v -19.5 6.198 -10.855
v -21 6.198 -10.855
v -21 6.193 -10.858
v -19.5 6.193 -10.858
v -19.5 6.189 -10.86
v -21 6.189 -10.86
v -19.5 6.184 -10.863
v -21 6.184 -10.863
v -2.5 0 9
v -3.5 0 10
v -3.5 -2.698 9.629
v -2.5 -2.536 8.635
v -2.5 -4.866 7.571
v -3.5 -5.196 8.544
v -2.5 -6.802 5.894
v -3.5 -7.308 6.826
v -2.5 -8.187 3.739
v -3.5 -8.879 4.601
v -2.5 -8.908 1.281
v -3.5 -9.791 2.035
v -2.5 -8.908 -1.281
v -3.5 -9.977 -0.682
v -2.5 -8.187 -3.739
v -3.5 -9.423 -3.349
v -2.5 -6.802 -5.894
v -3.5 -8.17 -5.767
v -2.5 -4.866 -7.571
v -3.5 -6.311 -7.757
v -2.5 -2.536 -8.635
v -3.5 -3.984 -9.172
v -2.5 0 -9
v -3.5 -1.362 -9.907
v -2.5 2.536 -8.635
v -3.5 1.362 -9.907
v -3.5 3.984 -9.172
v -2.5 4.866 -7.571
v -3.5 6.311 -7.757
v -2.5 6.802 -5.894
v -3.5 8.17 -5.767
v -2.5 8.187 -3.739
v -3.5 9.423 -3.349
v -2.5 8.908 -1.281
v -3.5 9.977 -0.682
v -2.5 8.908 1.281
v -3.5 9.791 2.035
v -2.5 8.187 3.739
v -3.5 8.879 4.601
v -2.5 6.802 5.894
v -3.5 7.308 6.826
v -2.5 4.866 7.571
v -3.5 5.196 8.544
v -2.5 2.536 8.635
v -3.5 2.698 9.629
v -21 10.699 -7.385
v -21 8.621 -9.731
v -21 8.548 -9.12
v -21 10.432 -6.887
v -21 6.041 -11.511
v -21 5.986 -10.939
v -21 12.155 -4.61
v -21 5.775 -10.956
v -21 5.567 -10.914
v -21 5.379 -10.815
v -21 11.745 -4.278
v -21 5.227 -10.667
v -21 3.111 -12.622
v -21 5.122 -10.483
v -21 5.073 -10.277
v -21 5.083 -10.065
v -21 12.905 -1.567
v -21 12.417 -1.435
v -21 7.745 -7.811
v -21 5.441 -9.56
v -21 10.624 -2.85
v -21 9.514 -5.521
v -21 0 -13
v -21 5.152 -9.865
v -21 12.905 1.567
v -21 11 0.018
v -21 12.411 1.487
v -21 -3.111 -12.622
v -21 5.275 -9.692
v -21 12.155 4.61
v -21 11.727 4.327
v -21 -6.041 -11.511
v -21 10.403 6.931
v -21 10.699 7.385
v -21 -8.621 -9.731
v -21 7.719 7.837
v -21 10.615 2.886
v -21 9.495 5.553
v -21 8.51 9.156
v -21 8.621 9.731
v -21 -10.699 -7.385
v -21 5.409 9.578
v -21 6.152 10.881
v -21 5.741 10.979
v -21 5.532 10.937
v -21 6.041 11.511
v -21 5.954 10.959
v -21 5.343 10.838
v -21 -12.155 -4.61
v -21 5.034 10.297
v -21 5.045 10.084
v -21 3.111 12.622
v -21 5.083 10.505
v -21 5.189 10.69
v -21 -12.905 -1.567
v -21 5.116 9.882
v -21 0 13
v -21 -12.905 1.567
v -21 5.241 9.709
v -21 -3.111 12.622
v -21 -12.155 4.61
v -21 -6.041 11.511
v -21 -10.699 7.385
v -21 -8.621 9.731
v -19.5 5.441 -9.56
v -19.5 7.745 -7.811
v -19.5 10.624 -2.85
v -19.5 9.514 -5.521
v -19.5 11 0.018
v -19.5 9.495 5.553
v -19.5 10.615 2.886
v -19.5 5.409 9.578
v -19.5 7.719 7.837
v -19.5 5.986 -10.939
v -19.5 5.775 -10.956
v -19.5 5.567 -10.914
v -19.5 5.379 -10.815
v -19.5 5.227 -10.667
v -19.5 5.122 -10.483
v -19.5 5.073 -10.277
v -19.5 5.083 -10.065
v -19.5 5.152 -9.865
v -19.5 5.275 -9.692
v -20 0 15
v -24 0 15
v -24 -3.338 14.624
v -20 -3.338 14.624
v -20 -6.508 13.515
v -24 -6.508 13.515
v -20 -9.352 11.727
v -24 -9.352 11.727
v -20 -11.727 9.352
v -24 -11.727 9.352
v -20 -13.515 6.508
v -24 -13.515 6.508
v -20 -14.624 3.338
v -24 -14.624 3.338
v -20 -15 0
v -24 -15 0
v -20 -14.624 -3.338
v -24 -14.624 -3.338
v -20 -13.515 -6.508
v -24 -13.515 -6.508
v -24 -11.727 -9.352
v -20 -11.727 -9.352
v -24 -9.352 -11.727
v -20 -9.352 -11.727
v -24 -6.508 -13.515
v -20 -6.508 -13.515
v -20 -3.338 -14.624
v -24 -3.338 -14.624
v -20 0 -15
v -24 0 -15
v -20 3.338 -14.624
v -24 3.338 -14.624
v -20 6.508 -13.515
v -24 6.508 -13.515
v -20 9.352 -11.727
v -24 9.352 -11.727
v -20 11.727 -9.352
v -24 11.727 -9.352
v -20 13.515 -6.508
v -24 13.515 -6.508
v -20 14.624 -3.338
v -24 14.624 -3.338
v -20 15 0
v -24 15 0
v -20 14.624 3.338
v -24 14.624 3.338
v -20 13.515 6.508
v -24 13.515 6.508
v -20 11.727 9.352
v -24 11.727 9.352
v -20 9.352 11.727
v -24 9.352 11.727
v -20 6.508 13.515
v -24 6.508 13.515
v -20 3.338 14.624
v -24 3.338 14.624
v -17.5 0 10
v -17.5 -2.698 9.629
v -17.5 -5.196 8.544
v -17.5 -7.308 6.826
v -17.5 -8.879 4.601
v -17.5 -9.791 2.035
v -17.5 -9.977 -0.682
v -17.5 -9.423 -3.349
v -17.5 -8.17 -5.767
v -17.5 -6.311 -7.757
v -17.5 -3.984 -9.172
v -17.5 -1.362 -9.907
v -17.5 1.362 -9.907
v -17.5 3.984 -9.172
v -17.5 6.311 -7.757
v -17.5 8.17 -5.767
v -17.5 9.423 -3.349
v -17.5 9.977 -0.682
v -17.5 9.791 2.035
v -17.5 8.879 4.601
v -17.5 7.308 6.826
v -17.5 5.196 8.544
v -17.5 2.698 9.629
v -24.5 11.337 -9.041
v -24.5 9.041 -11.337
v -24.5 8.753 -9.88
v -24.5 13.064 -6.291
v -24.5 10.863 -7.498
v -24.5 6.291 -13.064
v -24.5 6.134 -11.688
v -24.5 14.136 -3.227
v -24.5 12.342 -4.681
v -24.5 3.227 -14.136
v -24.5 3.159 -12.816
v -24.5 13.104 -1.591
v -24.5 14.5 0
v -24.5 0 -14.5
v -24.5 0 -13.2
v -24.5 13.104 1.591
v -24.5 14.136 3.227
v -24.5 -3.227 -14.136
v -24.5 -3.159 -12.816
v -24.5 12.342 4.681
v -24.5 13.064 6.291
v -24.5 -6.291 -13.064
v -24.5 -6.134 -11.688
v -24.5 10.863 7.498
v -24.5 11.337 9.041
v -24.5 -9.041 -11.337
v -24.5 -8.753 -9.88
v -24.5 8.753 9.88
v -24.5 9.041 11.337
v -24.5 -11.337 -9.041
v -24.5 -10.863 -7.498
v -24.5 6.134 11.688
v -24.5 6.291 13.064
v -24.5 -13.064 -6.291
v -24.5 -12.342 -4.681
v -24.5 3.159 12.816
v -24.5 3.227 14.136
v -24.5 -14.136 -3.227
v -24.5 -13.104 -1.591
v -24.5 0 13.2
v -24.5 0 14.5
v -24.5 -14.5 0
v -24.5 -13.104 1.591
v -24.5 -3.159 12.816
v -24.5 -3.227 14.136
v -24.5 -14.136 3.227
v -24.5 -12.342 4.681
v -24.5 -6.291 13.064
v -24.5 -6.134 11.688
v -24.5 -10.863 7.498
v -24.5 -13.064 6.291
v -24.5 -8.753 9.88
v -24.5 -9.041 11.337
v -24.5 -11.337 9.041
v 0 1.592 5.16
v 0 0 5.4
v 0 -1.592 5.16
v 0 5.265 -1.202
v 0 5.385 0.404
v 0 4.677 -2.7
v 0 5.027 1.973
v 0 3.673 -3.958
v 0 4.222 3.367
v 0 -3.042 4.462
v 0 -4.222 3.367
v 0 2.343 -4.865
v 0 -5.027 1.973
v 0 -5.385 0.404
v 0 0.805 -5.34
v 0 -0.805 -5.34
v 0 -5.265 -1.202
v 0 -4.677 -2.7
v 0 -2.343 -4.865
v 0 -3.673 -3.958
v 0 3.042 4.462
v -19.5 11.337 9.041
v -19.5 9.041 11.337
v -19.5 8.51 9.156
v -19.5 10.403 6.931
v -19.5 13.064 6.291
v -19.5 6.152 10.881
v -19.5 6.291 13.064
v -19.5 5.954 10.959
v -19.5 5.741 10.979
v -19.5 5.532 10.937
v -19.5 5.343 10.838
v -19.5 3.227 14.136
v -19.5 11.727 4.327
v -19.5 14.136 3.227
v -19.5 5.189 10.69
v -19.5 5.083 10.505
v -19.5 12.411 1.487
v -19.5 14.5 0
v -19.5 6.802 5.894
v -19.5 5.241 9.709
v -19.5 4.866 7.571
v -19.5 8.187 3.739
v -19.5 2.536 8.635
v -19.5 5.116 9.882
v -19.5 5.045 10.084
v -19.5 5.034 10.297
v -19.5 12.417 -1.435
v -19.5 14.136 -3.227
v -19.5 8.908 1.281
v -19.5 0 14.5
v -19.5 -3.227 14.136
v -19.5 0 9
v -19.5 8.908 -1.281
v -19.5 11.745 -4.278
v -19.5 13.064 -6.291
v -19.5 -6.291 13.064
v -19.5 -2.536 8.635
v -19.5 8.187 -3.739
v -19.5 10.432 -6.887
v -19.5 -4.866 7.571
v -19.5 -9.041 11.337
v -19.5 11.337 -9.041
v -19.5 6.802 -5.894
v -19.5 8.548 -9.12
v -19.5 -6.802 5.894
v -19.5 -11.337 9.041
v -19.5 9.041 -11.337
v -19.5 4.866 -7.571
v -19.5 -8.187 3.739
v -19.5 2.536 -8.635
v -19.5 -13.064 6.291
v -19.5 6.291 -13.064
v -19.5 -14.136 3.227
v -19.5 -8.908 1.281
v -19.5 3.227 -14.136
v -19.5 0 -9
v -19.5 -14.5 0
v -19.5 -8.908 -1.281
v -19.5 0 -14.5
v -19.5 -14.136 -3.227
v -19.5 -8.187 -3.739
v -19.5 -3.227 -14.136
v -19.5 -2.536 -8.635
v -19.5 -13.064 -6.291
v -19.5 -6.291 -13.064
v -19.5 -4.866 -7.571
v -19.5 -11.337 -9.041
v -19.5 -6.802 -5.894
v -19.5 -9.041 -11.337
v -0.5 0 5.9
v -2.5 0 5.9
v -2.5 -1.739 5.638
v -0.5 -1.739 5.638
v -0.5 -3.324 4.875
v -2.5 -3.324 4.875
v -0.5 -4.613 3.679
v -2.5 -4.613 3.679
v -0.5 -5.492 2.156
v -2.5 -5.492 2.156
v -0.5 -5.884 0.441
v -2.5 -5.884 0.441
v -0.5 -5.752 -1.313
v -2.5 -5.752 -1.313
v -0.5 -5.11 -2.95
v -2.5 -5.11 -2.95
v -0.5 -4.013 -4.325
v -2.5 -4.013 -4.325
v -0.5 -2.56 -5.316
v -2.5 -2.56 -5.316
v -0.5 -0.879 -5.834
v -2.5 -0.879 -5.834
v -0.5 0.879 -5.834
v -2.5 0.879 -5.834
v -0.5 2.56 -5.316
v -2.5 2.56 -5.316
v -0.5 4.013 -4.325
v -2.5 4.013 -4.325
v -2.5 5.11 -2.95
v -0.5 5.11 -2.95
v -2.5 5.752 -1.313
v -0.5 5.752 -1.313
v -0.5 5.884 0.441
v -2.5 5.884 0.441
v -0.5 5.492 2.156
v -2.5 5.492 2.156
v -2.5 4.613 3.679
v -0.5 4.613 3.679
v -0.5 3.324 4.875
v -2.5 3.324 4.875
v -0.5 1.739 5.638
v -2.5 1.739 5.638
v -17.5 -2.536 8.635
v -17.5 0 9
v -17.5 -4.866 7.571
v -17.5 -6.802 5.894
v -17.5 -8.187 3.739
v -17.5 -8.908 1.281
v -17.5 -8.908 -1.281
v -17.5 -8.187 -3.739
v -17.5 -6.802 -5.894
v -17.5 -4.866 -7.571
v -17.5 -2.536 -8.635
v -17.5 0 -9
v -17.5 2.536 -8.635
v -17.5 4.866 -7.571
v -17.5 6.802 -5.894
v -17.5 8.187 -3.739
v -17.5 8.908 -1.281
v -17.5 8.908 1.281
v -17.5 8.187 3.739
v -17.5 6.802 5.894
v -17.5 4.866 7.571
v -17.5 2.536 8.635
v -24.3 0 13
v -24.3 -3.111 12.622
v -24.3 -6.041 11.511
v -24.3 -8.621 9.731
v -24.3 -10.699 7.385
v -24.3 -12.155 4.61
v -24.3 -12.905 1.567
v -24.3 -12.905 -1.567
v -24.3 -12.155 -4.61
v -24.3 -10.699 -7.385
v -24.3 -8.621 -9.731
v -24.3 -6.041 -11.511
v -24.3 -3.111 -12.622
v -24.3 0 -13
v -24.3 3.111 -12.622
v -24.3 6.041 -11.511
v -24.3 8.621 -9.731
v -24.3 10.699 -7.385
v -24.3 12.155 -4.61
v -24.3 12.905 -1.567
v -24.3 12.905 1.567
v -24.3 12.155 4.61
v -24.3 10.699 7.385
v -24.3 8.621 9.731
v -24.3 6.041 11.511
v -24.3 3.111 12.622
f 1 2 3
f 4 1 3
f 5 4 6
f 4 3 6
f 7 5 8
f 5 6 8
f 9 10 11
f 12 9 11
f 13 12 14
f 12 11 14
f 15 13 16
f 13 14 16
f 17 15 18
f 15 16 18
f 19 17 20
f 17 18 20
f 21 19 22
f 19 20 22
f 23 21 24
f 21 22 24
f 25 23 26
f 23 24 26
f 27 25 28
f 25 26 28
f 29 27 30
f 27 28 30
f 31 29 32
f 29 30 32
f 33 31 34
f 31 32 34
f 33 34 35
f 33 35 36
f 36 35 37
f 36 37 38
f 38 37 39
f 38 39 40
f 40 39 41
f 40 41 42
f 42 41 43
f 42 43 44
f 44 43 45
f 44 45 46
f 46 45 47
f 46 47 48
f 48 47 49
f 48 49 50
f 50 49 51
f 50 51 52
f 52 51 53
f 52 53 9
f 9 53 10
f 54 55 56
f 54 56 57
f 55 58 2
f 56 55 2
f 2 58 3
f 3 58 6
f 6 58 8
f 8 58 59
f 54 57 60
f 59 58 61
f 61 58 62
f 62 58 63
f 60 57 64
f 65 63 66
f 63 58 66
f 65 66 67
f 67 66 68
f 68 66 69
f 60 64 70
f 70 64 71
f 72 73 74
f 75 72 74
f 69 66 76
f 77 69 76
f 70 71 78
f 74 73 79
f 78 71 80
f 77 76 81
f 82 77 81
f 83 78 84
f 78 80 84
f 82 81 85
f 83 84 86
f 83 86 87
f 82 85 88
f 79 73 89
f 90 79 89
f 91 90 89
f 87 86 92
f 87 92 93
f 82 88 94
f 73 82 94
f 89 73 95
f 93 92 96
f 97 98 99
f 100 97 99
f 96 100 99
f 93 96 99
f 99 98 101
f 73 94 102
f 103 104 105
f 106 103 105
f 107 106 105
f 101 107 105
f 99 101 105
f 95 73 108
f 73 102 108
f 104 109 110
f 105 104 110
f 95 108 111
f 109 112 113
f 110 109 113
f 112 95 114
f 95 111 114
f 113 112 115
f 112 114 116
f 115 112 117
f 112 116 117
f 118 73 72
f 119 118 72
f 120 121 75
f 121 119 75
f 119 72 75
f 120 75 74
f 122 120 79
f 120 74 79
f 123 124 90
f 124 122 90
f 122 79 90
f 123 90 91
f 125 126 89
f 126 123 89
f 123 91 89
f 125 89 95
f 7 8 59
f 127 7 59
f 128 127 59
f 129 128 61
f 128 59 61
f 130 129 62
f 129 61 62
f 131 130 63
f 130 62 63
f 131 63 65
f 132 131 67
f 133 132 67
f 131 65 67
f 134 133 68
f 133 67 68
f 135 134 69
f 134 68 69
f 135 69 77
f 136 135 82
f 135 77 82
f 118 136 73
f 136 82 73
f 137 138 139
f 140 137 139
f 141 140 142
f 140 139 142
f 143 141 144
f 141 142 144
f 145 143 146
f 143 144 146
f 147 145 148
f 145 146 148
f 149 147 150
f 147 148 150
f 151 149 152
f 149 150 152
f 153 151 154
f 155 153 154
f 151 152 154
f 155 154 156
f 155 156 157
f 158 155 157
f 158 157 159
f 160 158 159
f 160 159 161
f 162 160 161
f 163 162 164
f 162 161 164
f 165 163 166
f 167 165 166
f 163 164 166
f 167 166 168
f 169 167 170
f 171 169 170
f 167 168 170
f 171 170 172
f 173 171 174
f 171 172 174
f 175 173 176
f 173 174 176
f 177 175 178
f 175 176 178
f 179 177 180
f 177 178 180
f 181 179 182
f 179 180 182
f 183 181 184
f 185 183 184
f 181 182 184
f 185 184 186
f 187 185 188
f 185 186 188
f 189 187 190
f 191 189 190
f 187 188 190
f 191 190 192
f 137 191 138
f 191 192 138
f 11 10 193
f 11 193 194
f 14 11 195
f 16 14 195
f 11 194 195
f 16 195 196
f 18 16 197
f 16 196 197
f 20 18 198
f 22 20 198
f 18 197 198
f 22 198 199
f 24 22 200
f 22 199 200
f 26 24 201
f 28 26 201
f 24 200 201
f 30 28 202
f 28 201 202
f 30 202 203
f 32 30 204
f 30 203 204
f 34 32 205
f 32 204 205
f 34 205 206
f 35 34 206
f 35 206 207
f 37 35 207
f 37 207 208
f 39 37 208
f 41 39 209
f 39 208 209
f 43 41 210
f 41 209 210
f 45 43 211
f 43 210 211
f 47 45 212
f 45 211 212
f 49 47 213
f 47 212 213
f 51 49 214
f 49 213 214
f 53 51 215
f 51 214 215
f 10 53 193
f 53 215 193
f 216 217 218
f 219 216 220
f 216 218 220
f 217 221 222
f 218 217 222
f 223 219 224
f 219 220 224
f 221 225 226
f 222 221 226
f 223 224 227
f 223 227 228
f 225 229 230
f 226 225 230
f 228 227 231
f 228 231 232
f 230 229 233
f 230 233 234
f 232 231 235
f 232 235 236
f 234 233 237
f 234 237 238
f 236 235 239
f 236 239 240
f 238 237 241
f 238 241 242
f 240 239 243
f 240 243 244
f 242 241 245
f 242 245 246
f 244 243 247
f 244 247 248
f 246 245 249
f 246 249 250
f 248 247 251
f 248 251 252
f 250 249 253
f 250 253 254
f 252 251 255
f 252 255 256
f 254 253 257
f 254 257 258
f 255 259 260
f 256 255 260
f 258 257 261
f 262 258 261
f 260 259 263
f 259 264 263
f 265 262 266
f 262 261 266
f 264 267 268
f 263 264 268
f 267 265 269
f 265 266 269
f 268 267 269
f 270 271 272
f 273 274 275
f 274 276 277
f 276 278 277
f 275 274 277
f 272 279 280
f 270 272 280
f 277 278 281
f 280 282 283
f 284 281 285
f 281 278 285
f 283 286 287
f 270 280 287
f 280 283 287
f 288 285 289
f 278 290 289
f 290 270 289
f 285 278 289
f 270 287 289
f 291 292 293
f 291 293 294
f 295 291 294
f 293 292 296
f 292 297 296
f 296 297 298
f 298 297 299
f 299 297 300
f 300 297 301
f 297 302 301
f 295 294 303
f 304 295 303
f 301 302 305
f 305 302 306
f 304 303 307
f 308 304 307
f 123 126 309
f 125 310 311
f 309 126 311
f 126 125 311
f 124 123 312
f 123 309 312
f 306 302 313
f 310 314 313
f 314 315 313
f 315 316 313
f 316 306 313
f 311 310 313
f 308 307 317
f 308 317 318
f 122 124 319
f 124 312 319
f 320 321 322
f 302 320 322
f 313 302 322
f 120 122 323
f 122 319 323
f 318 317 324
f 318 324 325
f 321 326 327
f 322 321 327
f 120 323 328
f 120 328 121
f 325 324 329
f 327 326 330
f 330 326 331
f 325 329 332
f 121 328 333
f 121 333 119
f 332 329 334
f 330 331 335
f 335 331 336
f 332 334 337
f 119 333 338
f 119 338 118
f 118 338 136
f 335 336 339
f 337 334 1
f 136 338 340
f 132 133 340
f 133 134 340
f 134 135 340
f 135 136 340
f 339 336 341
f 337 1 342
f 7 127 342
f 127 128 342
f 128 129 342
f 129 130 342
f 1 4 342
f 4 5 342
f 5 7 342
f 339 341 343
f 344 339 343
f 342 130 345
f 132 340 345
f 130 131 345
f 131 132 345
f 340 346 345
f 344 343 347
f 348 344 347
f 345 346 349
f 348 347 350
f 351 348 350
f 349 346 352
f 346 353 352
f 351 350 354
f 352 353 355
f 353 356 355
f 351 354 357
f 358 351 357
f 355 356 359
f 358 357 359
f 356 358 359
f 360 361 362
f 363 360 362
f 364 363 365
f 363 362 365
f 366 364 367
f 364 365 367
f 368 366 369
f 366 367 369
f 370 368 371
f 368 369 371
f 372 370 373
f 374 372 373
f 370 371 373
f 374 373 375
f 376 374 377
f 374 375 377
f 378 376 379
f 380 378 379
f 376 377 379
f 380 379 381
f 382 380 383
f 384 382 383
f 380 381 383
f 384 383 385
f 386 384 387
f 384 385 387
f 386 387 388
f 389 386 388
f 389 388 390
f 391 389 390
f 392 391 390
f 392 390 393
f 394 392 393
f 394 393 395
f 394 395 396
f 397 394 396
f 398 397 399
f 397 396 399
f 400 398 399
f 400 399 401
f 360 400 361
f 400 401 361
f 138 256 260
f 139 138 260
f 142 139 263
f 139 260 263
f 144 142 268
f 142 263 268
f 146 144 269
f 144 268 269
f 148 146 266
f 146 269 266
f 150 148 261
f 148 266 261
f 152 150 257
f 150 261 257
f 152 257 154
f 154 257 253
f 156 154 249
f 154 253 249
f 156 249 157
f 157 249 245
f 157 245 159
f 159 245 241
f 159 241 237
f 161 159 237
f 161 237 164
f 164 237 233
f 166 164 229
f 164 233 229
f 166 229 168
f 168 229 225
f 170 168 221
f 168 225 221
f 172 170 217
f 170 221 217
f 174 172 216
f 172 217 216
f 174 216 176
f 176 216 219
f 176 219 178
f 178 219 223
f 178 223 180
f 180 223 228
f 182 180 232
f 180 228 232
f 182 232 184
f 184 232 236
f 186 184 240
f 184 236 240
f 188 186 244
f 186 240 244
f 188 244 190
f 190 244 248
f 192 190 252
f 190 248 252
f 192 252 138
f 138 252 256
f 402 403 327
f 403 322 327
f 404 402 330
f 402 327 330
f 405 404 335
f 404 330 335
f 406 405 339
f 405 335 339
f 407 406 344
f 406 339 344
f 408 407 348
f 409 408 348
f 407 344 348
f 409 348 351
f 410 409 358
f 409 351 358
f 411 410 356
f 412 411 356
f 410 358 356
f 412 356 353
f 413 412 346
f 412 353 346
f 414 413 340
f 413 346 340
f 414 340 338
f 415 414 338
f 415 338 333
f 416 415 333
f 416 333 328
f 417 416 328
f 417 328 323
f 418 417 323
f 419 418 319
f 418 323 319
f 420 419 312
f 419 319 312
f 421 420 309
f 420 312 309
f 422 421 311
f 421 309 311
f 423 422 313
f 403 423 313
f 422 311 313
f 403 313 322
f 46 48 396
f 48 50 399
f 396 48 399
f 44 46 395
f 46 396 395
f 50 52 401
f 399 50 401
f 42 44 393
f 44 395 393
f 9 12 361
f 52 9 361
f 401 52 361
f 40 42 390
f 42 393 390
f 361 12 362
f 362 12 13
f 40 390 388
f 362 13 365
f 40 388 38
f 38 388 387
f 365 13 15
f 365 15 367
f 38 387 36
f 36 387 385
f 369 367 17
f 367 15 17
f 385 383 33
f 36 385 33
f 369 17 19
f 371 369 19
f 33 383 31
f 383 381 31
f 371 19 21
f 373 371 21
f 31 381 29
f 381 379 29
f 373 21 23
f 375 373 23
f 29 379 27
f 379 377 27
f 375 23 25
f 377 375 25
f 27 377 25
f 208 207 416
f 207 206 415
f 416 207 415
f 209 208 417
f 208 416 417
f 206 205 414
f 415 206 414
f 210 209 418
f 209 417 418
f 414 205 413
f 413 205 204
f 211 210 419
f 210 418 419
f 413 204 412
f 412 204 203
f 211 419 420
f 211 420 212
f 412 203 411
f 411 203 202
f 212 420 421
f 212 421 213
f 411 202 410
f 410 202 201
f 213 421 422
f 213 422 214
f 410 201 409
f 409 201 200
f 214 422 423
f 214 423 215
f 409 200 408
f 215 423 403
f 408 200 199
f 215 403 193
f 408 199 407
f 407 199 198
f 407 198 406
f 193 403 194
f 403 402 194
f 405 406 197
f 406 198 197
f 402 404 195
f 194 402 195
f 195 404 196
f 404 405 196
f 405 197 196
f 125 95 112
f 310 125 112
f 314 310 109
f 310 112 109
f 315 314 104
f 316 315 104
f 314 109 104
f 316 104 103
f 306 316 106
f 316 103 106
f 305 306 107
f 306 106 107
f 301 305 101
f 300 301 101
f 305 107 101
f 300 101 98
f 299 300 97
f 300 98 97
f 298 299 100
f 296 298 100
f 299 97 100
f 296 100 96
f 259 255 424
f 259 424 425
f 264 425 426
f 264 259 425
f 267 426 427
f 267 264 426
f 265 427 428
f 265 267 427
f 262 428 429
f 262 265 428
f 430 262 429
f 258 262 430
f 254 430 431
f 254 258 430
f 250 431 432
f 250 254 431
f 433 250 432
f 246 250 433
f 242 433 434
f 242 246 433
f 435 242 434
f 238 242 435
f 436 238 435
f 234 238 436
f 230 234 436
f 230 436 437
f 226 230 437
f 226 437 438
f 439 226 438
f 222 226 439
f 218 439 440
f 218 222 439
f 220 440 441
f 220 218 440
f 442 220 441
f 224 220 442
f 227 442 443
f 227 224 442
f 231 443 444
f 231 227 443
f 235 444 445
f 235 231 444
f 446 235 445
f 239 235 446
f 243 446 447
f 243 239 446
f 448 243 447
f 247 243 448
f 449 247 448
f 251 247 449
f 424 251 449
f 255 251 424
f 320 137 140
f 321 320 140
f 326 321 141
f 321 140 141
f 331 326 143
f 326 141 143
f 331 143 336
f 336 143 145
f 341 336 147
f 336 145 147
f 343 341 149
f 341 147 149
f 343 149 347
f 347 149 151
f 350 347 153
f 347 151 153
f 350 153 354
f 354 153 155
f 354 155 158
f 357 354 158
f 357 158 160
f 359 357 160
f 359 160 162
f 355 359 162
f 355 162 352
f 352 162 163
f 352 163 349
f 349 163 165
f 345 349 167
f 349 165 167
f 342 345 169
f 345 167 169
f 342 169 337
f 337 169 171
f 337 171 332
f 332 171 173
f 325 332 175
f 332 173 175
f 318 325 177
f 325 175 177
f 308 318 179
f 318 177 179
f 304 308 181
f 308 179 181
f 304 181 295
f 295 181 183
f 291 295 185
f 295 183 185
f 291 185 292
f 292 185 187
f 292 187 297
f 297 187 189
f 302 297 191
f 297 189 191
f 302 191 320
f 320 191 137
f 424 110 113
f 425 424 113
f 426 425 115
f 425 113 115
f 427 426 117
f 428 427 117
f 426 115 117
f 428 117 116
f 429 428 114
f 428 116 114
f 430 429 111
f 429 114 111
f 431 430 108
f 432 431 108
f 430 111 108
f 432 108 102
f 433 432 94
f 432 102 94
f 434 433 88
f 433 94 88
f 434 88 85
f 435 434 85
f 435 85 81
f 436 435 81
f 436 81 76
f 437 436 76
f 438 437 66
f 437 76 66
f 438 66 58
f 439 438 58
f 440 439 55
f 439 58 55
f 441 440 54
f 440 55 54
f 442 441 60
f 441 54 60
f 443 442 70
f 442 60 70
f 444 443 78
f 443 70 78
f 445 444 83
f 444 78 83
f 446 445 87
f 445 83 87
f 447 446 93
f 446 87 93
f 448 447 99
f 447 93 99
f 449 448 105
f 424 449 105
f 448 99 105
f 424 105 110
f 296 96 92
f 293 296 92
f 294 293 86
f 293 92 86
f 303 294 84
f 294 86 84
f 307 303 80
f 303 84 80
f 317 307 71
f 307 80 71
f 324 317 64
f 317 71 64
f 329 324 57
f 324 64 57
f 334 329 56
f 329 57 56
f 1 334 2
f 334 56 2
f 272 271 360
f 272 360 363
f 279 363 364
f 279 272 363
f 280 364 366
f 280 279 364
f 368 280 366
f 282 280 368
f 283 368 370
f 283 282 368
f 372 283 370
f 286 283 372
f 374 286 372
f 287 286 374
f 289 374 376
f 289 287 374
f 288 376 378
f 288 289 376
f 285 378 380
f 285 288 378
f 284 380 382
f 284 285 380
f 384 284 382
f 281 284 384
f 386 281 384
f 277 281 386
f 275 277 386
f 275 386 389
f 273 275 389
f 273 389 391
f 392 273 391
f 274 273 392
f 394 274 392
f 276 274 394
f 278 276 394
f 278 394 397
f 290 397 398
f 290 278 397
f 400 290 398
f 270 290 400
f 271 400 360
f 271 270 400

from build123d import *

# Parameters (mm, degrees)
CHAMFER1_SIZE  = 1
CHAMFER2_SIZE  = 0.5
EXTRUDE2_DEPTH = 10
CHAMFER3_SIZE  = 0.5
CHAMFER4_SIZE  = 0.2


with BuildPart() as part:
    # Sketch1 → Revolve1 (revolve)
    with BuildSketch(Plane.XY, mode=Mode.PRIVATE) as revolve1_sk:
        Polygon((0, 0), (0, 5.9), (-2.5, 5.9), (-2.5, 10), (-17.5, 10), (-17.5, 9), (-19.5, 9), (-19.5, 15), (-24.5, 15), (-24.5, 13), (-21, 13), (-21, 0), align=None)
    revolve(revolve1_sk.sketch.rotate(Axis((-24.5, 0, 0), (1, 0, 0)), 90), axis=Axis((-24.5, 0, 0), (1, 0, 0)))

    # Chamfer1
    chamfer1_edges = [part.edges().sort_by_distance(p)[0] for p in [
        (-2.5, 0, -10),
    ]]
    chamfer(chamfer1_edges, length=CHAMFER1_SIZE)

    # Chamfer2
    chamfer2_edges = [part.edges().sort_by_distance(p)[0] for p in [
        (0, 0, -5.9),
    ]]
    chamfer(chamfer2_edges, length=CHAMFER2_SIZE)

    # Sketch2 → Extrude2 (cut)
    with BuildSketch(Plane.ZY.offset(21)):
        with BuildLine():
            ThreePointArc((9.578114368, 5.40922593), (10.601186453, 5.129330555), (10.881081828, 6.152402641))
            ThreePointArc((10.881081828, 6.152402641), (0.026245134, 12.499972448), (-10.855150648, 6.198040369))
            ThreePointArc((-10.855150648, 6.198040369), (-10.859121552, 6.19108061), (-10.863087994, 6.184118308))
            ThreePointArc((-10.863087994, 6.184118308), (-10.579057999, 5.168029786), (-9.559993103, 5.441188461))
            ThreePointArc((-9.559993103, 5.441188461), (0.018371062, 10.999984659), (9.578114368, 5.40922593))
        make_face()
    extrude(amount=-EXTRUDE2_DEPTH, mode=Mode.SUBTRACT)

    # Chamfer3
    chamfer3_edges = [part.edges().sort_by_distance(p)[0] for p in [
        (-19.5, 0, -15),
        (-24.5, 0, -15),
    ]]
    chamfer(chamfer3_edges, length=CHAMFER3_SIZE)

    # Chamfer4
    chamfer4_edges = [part.edges().sort_by_distance(p)[0] for p in [
        (-24.5, 0, -13),
    ]]
    chamfer(chamfer4_edges, length=CHAMFER4_SIZE)


solid = part.part
